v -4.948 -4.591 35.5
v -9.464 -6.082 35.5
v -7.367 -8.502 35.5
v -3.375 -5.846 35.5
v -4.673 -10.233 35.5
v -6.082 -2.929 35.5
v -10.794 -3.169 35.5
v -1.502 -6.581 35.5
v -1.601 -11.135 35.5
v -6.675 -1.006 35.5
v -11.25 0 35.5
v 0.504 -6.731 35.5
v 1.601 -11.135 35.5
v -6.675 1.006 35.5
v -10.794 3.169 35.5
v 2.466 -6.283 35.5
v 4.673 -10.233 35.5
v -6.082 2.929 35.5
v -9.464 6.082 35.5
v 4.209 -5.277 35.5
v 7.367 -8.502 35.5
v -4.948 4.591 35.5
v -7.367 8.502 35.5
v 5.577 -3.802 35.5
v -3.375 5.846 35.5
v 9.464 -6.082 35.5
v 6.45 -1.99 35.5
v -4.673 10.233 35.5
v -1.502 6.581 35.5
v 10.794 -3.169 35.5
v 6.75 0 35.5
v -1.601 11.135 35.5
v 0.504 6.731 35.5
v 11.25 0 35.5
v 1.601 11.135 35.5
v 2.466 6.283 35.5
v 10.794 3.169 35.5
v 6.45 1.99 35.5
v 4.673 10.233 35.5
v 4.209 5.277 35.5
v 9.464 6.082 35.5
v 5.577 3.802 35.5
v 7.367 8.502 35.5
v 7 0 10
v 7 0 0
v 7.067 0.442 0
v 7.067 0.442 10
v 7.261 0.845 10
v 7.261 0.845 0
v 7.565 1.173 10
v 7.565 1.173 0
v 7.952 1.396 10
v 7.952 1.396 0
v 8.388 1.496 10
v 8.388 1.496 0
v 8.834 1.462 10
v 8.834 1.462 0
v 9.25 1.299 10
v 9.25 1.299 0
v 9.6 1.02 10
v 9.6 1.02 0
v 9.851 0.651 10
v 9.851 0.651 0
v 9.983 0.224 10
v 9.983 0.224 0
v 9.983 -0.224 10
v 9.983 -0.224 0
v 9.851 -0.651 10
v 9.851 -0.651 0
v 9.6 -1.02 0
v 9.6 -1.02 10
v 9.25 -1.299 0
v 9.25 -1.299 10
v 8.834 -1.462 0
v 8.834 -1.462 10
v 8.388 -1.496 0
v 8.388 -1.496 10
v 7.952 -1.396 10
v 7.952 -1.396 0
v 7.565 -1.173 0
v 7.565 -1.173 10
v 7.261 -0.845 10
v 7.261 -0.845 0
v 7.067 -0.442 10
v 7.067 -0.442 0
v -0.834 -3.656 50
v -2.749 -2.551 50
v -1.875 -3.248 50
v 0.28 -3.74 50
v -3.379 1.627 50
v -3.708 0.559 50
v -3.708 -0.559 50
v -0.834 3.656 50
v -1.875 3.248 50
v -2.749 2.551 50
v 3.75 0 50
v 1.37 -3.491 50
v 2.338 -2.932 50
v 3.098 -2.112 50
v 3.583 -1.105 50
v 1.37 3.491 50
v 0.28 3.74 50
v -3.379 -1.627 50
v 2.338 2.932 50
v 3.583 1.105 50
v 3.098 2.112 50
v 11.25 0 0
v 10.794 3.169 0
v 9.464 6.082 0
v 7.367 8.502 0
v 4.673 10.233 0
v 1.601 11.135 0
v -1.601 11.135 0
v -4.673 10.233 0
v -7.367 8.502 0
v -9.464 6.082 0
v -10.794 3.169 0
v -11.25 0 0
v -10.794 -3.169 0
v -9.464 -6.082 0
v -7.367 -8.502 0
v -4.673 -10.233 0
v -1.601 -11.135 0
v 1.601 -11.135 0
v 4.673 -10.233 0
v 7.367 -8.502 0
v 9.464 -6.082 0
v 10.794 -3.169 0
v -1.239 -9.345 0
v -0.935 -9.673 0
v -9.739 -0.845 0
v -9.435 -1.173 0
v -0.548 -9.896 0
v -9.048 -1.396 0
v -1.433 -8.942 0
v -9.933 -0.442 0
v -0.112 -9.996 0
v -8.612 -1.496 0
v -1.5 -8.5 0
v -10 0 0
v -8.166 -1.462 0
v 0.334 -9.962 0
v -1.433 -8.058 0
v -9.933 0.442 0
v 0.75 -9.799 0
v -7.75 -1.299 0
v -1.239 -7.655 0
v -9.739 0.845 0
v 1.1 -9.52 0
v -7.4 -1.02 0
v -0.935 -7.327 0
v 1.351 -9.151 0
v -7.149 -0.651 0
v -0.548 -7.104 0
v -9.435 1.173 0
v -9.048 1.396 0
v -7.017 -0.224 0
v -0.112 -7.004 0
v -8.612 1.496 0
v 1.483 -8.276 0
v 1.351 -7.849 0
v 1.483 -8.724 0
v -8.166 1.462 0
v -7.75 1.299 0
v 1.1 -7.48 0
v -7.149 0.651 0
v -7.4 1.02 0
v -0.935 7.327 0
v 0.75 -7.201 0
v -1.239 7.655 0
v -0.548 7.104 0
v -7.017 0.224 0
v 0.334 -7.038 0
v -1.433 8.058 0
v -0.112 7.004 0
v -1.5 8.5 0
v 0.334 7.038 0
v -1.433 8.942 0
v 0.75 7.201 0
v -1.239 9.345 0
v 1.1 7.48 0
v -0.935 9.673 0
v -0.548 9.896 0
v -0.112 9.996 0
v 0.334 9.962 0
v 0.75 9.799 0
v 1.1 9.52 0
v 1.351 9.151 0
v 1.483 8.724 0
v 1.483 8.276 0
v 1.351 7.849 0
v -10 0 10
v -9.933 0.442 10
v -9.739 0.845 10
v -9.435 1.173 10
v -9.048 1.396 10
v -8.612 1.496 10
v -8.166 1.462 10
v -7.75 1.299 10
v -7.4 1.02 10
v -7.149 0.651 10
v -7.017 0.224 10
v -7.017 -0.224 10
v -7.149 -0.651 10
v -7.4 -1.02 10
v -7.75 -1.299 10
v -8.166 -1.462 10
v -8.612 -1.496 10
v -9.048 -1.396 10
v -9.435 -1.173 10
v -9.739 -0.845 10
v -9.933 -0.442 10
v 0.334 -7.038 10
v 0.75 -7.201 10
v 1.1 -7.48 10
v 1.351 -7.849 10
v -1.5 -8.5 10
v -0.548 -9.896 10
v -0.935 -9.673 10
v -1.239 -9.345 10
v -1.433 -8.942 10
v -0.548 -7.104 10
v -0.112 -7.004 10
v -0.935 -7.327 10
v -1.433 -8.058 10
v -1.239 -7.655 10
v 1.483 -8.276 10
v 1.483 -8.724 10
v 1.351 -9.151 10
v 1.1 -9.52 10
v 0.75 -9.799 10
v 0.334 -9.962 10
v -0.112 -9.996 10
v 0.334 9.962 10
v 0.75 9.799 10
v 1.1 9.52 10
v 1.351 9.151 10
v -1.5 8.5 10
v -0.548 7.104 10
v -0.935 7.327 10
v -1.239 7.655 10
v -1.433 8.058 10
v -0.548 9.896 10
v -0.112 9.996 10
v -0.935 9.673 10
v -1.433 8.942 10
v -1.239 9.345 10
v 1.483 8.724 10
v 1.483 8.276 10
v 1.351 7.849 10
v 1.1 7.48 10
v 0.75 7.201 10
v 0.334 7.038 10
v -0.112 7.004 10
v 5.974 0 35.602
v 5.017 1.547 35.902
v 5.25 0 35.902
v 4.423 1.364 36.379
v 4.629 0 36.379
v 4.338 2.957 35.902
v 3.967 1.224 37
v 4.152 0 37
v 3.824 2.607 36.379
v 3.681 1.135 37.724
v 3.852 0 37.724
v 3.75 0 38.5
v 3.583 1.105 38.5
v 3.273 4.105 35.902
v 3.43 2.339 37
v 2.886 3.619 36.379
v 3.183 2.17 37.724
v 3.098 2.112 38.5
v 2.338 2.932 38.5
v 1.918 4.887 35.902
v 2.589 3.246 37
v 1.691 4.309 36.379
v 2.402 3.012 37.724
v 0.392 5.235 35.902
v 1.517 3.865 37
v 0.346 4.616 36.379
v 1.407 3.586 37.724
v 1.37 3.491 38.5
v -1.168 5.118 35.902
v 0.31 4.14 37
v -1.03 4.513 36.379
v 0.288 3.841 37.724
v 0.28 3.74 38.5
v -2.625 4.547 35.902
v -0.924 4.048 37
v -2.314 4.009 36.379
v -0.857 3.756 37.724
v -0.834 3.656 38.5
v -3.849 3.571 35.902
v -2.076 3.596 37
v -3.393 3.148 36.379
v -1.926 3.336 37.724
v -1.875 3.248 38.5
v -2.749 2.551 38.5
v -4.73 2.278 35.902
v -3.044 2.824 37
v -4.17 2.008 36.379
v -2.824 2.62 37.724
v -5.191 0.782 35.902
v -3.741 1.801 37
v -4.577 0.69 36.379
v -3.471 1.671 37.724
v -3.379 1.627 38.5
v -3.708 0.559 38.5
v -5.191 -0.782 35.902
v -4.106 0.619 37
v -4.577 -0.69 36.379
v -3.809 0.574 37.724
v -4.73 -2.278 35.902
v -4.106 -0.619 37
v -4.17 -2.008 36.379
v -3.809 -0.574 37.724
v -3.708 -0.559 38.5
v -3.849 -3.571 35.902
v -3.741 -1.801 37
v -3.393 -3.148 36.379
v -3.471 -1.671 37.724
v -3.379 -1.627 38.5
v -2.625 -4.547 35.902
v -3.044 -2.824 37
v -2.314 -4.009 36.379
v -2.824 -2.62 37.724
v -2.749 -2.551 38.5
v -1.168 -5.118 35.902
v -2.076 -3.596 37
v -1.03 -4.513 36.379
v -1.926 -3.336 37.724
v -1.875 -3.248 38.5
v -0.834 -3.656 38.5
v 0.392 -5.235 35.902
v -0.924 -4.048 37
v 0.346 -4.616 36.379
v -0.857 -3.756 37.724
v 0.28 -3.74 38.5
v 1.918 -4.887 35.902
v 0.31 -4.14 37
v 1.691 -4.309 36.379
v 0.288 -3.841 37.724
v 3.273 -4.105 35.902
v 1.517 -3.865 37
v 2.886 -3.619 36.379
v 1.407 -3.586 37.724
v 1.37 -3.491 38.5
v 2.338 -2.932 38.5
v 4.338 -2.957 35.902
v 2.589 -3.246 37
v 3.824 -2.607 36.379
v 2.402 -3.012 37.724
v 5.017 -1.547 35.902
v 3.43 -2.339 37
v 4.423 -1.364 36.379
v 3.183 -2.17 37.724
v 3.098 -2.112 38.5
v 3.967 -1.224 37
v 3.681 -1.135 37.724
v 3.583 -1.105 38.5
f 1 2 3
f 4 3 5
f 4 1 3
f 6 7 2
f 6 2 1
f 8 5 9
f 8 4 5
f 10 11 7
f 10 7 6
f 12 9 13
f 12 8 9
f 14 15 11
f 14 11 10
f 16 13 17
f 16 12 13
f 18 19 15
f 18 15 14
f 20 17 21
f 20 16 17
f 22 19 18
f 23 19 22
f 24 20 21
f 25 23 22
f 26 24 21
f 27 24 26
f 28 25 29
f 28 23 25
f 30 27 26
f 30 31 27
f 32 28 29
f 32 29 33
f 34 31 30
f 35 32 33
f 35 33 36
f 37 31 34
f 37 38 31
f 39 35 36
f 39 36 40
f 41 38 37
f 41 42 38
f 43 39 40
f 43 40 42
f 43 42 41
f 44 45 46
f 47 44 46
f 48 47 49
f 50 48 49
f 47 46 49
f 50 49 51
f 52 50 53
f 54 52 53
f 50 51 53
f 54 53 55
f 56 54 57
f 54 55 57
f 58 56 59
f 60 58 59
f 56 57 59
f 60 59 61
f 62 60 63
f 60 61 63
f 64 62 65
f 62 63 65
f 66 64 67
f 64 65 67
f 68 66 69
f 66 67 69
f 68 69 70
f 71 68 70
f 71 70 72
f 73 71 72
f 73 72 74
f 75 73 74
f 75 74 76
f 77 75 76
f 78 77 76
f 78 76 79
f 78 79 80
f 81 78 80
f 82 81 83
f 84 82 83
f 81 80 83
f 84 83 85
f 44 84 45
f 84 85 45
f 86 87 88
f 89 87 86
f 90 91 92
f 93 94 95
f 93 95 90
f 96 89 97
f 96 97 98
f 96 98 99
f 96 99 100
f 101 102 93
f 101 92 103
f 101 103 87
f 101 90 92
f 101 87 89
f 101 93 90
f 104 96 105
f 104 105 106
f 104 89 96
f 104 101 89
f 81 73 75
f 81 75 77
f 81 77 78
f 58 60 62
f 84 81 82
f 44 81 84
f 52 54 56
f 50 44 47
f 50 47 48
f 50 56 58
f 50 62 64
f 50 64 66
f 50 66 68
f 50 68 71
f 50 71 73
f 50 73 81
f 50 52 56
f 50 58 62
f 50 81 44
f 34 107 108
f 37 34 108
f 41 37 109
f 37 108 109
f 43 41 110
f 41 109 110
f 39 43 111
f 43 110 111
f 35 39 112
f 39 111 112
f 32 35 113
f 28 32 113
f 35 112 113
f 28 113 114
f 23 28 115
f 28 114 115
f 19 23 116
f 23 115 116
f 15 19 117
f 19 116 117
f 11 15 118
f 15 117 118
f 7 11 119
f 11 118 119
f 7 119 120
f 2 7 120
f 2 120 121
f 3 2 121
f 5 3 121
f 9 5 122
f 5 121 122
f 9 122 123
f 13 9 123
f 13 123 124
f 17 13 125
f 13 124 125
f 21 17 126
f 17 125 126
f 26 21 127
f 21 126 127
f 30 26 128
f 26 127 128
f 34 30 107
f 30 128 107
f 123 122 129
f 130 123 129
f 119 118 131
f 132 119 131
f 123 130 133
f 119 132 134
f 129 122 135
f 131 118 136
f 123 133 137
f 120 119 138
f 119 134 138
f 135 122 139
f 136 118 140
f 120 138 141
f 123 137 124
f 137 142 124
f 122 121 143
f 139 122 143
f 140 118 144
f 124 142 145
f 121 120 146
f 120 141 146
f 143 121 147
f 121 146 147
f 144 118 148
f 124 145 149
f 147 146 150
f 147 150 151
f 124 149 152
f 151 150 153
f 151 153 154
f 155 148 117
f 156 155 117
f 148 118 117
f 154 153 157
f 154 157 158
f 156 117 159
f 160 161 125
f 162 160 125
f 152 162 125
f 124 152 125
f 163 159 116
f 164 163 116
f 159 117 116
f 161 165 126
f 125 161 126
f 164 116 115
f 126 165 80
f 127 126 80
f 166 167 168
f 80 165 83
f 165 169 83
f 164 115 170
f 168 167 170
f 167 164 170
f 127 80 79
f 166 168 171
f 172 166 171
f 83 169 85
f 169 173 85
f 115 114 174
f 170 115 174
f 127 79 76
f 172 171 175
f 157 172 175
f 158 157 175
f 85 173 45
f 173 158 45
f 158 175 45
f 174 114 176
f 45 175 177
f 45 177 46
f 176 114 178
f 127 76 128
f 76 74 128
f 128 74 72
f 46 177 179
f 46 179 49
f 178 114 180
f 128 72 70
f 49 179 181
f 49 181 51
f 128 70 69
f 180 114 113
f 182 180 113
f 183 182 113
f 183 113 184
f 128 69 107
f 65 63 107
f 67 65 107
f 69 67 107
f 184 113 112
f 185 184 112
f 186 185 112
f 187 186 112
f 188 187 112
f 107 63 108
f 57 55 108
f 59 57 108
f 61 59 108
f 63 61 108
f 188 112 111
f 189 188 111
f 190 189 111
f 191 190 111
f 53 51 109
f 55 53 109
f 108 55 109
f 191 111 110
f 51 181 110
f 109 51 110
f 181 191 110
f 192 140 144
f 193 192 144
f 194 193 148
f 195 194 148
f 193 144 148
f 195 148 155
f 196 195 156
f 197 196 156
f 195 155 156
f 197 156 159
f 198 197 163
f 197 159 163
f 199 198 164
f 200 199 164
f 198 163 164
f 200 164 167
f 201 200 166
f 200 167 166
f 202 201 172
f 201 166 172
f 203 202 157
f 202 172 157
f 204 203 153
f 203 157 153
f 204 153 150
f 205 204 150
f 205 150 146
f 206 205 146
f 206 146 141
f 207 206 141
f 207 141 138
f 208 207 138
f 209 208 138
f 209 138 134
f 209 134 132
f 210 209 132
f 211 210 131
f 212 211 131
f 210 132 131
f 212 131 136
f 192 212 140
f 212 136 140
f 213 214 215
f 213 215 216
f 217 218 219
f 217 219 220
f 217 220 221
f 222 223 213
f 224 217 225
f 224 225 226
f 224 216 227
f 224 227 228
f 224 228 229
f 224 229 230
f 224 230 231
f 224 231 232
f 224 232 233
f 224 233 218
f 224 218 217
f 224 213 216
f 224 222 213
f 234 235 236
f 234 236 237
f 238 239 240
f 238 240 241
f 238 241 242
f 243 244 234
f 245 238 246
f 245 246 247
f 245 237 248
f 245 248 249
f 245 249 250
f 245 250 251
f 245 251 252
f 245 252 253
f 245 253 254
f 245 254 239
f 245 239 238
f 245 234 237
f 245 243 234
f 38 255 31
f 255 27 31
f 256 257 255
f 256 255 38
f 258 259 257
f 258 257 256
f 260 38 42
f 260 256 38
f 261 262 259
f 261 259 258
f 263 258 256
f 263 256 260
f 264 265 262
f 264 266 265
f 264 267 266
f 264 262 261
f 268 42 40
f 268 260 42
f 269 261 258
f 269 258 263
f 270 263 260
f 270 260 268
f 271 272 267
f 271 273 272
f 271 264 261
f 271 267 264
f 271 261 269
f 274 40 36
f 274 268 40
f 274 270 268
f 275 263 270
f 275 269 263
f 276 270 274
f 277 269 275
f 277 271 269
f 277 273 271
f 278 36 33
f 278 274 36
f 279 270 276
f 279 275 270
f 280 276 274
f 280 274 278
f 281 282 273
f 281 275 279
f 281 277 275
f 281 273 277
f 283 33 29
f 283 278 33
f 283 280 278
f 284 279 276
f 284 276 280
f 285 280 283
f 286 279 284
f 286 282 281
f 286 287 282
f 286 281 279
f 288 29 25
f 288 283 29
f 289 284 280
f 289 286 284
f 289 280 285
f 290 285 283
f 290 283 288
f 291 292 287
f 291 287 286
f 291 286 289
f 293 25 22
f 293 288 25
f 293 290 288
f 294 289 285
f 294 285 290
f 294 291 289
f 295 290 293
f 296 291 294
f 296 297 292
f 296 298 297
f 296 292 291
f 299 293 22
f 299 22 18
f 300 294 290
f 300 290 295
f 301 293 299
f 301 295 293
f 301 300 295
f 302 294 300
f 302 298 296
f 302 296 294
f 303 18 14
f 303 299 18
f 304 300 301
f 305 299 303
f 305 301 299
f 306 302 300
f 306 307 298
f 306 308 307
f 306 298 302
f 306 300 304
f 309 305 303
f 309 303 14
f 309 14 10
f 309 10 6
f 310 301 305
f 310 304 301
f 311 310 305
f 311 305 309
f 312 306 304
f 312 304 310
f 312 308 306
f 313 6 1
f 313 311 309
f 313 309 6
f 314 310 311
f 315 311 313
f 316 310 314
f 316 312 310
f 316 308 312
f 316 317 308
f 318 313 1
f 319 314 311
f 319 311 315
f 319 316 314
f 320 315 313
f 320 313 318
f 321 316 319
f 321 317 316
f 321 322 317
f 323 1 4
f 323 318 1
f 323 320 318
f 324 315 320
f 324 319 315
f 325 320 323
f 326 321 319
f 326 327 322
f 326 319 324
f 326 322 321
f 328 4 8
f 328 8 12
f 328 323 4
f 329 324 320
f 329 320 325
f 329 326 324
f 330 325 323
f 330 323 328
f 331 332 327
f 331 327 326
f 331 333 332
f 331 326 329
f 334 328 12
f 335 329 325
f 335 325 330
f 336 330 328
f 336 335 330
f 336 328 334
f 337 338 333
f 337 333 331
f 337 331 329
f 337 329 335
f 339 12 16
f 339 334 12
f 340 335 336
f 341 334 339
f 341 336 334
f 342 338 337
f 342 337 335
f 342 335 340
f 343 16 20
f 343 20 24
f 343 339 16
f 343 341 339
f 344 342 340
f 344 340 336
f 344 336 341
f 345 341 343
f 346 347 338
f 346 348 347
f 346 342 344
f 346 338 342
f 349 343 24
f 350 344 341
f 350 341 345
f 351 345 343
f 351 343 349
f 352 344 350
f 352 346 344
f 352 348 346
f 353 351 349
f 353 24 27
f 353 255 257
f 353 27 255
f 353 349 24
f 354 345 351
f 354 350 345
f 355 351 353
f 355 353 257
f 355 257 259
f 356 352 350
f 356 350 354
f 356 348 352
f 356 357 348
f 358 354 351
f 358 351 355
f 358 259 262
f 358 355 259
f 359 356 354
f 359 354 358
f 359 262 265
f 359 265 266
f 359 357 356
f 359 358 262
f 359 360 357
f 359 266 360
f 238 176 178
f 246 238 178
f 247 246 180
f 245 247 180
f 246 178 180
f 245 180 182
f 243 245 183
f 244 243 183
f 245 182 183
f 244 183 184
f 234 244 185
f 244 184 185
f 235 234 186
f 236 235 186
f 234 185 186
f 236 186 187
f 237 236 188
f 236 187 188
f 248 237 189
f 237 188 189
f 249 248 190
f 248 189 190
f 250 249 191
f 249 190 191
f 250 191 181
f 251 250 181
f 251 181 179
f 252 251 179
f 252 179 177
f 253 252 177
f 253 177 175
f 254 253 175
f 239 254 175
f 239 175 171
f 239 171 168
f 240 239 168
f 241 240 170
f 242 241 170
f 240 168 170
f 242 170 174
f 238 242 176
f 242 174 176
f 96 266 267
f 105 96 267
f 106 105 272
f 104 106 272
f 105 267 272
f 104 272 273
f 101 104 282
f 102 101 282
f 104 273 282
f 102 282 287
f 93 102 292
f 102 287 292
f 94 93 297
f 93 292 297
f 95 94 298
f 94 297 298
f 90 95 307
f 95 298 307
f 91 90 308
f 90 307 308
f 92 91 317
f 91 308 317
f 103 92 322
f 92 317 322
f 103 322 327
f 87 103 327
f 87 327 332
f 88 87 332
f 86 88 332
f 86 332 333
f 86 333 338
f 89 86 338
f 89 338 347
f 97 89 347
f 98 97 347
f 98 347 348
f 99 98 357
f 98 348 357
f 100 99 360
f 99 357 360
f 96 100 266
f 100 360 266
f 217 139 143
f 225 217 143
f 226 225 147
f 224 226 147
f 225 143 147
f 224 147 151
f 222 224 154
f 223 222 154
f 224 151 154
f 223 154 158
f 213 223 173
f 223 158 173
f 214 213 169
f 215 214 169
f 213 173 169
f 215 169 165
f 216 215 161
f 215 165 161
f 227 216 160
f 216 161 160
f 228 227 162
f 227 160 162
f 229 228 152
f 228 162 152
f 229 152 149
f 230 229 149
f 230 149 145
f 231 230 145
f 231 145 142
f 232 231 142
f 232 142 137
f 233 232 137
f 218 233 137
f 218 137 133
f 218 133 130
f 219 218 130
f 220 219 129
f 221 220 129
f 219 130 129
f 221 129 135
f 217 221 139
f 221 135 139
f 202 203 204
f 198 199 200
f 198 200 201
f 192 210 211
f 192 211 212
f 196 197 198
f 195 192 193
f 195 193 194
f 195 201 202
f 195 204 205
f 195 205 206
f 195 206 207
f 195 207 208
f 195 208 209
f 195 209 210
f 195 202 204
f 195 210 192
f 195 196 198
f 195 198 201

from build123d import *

# Parameters (mm, degrees)
SKETCH_1_R          = 11.25
EXTRUDE_1_DEPTH     = 35.5
SKETCH_2_R          = 3.75
EXTRUDE_2_DEPTH     = 14.5
FILLET_1_R          = 3
SKETCH_3_R          = 1.5
CUT_EXTRUDE_1_DEPTH = 10


with BuildPart() as part:
    # 草圖1 → 填料-伸長1 (new body)
    with BuildSketch(Plane.XY):
        Circle(SKETCH_1_R)
    extrude(amount=EXTRUDE_1_DEPTH)

    # 草圖2 → 填料-伸長2 (add)
    with BuildSketch(Plane.XY.offset(35.5)):
        Circle(SKETCH_2_R)
    extrude(amount=EXTRUDE_2_DEPTH)

    # 圓角1
    fillet_1_edges = [part.edges().sort_by_distance(p)[0] for p in [
        (-3.75, 0, 35.5),
    ]]
    fillet(fillet_1_edges, radius=FILLET_1_R)

    # 草圖3 → 除料-伸長1 (cut)
    with BuildSketch(Plane(origin=(0, 0, 0), x_dir=(-1, 0, 0), z_dir=(0, 0, -1))):
        with Locations((-8.5, 0)):
            Circle(SKETCH_3_R)
        with Locations((8.5, 0)):
            Circle(SKETCH_3_R)
        with Locations((0, -8.5)):
            Circle(SKETCH_3_R)
        with Locations((0, 8.5)):
            Circle(SKETCH_3_R)
    extrude(amount=-CUT_EXTRUDE_1_DEPTH, mode=Mode.SUBTRACT)


solid = part.part
